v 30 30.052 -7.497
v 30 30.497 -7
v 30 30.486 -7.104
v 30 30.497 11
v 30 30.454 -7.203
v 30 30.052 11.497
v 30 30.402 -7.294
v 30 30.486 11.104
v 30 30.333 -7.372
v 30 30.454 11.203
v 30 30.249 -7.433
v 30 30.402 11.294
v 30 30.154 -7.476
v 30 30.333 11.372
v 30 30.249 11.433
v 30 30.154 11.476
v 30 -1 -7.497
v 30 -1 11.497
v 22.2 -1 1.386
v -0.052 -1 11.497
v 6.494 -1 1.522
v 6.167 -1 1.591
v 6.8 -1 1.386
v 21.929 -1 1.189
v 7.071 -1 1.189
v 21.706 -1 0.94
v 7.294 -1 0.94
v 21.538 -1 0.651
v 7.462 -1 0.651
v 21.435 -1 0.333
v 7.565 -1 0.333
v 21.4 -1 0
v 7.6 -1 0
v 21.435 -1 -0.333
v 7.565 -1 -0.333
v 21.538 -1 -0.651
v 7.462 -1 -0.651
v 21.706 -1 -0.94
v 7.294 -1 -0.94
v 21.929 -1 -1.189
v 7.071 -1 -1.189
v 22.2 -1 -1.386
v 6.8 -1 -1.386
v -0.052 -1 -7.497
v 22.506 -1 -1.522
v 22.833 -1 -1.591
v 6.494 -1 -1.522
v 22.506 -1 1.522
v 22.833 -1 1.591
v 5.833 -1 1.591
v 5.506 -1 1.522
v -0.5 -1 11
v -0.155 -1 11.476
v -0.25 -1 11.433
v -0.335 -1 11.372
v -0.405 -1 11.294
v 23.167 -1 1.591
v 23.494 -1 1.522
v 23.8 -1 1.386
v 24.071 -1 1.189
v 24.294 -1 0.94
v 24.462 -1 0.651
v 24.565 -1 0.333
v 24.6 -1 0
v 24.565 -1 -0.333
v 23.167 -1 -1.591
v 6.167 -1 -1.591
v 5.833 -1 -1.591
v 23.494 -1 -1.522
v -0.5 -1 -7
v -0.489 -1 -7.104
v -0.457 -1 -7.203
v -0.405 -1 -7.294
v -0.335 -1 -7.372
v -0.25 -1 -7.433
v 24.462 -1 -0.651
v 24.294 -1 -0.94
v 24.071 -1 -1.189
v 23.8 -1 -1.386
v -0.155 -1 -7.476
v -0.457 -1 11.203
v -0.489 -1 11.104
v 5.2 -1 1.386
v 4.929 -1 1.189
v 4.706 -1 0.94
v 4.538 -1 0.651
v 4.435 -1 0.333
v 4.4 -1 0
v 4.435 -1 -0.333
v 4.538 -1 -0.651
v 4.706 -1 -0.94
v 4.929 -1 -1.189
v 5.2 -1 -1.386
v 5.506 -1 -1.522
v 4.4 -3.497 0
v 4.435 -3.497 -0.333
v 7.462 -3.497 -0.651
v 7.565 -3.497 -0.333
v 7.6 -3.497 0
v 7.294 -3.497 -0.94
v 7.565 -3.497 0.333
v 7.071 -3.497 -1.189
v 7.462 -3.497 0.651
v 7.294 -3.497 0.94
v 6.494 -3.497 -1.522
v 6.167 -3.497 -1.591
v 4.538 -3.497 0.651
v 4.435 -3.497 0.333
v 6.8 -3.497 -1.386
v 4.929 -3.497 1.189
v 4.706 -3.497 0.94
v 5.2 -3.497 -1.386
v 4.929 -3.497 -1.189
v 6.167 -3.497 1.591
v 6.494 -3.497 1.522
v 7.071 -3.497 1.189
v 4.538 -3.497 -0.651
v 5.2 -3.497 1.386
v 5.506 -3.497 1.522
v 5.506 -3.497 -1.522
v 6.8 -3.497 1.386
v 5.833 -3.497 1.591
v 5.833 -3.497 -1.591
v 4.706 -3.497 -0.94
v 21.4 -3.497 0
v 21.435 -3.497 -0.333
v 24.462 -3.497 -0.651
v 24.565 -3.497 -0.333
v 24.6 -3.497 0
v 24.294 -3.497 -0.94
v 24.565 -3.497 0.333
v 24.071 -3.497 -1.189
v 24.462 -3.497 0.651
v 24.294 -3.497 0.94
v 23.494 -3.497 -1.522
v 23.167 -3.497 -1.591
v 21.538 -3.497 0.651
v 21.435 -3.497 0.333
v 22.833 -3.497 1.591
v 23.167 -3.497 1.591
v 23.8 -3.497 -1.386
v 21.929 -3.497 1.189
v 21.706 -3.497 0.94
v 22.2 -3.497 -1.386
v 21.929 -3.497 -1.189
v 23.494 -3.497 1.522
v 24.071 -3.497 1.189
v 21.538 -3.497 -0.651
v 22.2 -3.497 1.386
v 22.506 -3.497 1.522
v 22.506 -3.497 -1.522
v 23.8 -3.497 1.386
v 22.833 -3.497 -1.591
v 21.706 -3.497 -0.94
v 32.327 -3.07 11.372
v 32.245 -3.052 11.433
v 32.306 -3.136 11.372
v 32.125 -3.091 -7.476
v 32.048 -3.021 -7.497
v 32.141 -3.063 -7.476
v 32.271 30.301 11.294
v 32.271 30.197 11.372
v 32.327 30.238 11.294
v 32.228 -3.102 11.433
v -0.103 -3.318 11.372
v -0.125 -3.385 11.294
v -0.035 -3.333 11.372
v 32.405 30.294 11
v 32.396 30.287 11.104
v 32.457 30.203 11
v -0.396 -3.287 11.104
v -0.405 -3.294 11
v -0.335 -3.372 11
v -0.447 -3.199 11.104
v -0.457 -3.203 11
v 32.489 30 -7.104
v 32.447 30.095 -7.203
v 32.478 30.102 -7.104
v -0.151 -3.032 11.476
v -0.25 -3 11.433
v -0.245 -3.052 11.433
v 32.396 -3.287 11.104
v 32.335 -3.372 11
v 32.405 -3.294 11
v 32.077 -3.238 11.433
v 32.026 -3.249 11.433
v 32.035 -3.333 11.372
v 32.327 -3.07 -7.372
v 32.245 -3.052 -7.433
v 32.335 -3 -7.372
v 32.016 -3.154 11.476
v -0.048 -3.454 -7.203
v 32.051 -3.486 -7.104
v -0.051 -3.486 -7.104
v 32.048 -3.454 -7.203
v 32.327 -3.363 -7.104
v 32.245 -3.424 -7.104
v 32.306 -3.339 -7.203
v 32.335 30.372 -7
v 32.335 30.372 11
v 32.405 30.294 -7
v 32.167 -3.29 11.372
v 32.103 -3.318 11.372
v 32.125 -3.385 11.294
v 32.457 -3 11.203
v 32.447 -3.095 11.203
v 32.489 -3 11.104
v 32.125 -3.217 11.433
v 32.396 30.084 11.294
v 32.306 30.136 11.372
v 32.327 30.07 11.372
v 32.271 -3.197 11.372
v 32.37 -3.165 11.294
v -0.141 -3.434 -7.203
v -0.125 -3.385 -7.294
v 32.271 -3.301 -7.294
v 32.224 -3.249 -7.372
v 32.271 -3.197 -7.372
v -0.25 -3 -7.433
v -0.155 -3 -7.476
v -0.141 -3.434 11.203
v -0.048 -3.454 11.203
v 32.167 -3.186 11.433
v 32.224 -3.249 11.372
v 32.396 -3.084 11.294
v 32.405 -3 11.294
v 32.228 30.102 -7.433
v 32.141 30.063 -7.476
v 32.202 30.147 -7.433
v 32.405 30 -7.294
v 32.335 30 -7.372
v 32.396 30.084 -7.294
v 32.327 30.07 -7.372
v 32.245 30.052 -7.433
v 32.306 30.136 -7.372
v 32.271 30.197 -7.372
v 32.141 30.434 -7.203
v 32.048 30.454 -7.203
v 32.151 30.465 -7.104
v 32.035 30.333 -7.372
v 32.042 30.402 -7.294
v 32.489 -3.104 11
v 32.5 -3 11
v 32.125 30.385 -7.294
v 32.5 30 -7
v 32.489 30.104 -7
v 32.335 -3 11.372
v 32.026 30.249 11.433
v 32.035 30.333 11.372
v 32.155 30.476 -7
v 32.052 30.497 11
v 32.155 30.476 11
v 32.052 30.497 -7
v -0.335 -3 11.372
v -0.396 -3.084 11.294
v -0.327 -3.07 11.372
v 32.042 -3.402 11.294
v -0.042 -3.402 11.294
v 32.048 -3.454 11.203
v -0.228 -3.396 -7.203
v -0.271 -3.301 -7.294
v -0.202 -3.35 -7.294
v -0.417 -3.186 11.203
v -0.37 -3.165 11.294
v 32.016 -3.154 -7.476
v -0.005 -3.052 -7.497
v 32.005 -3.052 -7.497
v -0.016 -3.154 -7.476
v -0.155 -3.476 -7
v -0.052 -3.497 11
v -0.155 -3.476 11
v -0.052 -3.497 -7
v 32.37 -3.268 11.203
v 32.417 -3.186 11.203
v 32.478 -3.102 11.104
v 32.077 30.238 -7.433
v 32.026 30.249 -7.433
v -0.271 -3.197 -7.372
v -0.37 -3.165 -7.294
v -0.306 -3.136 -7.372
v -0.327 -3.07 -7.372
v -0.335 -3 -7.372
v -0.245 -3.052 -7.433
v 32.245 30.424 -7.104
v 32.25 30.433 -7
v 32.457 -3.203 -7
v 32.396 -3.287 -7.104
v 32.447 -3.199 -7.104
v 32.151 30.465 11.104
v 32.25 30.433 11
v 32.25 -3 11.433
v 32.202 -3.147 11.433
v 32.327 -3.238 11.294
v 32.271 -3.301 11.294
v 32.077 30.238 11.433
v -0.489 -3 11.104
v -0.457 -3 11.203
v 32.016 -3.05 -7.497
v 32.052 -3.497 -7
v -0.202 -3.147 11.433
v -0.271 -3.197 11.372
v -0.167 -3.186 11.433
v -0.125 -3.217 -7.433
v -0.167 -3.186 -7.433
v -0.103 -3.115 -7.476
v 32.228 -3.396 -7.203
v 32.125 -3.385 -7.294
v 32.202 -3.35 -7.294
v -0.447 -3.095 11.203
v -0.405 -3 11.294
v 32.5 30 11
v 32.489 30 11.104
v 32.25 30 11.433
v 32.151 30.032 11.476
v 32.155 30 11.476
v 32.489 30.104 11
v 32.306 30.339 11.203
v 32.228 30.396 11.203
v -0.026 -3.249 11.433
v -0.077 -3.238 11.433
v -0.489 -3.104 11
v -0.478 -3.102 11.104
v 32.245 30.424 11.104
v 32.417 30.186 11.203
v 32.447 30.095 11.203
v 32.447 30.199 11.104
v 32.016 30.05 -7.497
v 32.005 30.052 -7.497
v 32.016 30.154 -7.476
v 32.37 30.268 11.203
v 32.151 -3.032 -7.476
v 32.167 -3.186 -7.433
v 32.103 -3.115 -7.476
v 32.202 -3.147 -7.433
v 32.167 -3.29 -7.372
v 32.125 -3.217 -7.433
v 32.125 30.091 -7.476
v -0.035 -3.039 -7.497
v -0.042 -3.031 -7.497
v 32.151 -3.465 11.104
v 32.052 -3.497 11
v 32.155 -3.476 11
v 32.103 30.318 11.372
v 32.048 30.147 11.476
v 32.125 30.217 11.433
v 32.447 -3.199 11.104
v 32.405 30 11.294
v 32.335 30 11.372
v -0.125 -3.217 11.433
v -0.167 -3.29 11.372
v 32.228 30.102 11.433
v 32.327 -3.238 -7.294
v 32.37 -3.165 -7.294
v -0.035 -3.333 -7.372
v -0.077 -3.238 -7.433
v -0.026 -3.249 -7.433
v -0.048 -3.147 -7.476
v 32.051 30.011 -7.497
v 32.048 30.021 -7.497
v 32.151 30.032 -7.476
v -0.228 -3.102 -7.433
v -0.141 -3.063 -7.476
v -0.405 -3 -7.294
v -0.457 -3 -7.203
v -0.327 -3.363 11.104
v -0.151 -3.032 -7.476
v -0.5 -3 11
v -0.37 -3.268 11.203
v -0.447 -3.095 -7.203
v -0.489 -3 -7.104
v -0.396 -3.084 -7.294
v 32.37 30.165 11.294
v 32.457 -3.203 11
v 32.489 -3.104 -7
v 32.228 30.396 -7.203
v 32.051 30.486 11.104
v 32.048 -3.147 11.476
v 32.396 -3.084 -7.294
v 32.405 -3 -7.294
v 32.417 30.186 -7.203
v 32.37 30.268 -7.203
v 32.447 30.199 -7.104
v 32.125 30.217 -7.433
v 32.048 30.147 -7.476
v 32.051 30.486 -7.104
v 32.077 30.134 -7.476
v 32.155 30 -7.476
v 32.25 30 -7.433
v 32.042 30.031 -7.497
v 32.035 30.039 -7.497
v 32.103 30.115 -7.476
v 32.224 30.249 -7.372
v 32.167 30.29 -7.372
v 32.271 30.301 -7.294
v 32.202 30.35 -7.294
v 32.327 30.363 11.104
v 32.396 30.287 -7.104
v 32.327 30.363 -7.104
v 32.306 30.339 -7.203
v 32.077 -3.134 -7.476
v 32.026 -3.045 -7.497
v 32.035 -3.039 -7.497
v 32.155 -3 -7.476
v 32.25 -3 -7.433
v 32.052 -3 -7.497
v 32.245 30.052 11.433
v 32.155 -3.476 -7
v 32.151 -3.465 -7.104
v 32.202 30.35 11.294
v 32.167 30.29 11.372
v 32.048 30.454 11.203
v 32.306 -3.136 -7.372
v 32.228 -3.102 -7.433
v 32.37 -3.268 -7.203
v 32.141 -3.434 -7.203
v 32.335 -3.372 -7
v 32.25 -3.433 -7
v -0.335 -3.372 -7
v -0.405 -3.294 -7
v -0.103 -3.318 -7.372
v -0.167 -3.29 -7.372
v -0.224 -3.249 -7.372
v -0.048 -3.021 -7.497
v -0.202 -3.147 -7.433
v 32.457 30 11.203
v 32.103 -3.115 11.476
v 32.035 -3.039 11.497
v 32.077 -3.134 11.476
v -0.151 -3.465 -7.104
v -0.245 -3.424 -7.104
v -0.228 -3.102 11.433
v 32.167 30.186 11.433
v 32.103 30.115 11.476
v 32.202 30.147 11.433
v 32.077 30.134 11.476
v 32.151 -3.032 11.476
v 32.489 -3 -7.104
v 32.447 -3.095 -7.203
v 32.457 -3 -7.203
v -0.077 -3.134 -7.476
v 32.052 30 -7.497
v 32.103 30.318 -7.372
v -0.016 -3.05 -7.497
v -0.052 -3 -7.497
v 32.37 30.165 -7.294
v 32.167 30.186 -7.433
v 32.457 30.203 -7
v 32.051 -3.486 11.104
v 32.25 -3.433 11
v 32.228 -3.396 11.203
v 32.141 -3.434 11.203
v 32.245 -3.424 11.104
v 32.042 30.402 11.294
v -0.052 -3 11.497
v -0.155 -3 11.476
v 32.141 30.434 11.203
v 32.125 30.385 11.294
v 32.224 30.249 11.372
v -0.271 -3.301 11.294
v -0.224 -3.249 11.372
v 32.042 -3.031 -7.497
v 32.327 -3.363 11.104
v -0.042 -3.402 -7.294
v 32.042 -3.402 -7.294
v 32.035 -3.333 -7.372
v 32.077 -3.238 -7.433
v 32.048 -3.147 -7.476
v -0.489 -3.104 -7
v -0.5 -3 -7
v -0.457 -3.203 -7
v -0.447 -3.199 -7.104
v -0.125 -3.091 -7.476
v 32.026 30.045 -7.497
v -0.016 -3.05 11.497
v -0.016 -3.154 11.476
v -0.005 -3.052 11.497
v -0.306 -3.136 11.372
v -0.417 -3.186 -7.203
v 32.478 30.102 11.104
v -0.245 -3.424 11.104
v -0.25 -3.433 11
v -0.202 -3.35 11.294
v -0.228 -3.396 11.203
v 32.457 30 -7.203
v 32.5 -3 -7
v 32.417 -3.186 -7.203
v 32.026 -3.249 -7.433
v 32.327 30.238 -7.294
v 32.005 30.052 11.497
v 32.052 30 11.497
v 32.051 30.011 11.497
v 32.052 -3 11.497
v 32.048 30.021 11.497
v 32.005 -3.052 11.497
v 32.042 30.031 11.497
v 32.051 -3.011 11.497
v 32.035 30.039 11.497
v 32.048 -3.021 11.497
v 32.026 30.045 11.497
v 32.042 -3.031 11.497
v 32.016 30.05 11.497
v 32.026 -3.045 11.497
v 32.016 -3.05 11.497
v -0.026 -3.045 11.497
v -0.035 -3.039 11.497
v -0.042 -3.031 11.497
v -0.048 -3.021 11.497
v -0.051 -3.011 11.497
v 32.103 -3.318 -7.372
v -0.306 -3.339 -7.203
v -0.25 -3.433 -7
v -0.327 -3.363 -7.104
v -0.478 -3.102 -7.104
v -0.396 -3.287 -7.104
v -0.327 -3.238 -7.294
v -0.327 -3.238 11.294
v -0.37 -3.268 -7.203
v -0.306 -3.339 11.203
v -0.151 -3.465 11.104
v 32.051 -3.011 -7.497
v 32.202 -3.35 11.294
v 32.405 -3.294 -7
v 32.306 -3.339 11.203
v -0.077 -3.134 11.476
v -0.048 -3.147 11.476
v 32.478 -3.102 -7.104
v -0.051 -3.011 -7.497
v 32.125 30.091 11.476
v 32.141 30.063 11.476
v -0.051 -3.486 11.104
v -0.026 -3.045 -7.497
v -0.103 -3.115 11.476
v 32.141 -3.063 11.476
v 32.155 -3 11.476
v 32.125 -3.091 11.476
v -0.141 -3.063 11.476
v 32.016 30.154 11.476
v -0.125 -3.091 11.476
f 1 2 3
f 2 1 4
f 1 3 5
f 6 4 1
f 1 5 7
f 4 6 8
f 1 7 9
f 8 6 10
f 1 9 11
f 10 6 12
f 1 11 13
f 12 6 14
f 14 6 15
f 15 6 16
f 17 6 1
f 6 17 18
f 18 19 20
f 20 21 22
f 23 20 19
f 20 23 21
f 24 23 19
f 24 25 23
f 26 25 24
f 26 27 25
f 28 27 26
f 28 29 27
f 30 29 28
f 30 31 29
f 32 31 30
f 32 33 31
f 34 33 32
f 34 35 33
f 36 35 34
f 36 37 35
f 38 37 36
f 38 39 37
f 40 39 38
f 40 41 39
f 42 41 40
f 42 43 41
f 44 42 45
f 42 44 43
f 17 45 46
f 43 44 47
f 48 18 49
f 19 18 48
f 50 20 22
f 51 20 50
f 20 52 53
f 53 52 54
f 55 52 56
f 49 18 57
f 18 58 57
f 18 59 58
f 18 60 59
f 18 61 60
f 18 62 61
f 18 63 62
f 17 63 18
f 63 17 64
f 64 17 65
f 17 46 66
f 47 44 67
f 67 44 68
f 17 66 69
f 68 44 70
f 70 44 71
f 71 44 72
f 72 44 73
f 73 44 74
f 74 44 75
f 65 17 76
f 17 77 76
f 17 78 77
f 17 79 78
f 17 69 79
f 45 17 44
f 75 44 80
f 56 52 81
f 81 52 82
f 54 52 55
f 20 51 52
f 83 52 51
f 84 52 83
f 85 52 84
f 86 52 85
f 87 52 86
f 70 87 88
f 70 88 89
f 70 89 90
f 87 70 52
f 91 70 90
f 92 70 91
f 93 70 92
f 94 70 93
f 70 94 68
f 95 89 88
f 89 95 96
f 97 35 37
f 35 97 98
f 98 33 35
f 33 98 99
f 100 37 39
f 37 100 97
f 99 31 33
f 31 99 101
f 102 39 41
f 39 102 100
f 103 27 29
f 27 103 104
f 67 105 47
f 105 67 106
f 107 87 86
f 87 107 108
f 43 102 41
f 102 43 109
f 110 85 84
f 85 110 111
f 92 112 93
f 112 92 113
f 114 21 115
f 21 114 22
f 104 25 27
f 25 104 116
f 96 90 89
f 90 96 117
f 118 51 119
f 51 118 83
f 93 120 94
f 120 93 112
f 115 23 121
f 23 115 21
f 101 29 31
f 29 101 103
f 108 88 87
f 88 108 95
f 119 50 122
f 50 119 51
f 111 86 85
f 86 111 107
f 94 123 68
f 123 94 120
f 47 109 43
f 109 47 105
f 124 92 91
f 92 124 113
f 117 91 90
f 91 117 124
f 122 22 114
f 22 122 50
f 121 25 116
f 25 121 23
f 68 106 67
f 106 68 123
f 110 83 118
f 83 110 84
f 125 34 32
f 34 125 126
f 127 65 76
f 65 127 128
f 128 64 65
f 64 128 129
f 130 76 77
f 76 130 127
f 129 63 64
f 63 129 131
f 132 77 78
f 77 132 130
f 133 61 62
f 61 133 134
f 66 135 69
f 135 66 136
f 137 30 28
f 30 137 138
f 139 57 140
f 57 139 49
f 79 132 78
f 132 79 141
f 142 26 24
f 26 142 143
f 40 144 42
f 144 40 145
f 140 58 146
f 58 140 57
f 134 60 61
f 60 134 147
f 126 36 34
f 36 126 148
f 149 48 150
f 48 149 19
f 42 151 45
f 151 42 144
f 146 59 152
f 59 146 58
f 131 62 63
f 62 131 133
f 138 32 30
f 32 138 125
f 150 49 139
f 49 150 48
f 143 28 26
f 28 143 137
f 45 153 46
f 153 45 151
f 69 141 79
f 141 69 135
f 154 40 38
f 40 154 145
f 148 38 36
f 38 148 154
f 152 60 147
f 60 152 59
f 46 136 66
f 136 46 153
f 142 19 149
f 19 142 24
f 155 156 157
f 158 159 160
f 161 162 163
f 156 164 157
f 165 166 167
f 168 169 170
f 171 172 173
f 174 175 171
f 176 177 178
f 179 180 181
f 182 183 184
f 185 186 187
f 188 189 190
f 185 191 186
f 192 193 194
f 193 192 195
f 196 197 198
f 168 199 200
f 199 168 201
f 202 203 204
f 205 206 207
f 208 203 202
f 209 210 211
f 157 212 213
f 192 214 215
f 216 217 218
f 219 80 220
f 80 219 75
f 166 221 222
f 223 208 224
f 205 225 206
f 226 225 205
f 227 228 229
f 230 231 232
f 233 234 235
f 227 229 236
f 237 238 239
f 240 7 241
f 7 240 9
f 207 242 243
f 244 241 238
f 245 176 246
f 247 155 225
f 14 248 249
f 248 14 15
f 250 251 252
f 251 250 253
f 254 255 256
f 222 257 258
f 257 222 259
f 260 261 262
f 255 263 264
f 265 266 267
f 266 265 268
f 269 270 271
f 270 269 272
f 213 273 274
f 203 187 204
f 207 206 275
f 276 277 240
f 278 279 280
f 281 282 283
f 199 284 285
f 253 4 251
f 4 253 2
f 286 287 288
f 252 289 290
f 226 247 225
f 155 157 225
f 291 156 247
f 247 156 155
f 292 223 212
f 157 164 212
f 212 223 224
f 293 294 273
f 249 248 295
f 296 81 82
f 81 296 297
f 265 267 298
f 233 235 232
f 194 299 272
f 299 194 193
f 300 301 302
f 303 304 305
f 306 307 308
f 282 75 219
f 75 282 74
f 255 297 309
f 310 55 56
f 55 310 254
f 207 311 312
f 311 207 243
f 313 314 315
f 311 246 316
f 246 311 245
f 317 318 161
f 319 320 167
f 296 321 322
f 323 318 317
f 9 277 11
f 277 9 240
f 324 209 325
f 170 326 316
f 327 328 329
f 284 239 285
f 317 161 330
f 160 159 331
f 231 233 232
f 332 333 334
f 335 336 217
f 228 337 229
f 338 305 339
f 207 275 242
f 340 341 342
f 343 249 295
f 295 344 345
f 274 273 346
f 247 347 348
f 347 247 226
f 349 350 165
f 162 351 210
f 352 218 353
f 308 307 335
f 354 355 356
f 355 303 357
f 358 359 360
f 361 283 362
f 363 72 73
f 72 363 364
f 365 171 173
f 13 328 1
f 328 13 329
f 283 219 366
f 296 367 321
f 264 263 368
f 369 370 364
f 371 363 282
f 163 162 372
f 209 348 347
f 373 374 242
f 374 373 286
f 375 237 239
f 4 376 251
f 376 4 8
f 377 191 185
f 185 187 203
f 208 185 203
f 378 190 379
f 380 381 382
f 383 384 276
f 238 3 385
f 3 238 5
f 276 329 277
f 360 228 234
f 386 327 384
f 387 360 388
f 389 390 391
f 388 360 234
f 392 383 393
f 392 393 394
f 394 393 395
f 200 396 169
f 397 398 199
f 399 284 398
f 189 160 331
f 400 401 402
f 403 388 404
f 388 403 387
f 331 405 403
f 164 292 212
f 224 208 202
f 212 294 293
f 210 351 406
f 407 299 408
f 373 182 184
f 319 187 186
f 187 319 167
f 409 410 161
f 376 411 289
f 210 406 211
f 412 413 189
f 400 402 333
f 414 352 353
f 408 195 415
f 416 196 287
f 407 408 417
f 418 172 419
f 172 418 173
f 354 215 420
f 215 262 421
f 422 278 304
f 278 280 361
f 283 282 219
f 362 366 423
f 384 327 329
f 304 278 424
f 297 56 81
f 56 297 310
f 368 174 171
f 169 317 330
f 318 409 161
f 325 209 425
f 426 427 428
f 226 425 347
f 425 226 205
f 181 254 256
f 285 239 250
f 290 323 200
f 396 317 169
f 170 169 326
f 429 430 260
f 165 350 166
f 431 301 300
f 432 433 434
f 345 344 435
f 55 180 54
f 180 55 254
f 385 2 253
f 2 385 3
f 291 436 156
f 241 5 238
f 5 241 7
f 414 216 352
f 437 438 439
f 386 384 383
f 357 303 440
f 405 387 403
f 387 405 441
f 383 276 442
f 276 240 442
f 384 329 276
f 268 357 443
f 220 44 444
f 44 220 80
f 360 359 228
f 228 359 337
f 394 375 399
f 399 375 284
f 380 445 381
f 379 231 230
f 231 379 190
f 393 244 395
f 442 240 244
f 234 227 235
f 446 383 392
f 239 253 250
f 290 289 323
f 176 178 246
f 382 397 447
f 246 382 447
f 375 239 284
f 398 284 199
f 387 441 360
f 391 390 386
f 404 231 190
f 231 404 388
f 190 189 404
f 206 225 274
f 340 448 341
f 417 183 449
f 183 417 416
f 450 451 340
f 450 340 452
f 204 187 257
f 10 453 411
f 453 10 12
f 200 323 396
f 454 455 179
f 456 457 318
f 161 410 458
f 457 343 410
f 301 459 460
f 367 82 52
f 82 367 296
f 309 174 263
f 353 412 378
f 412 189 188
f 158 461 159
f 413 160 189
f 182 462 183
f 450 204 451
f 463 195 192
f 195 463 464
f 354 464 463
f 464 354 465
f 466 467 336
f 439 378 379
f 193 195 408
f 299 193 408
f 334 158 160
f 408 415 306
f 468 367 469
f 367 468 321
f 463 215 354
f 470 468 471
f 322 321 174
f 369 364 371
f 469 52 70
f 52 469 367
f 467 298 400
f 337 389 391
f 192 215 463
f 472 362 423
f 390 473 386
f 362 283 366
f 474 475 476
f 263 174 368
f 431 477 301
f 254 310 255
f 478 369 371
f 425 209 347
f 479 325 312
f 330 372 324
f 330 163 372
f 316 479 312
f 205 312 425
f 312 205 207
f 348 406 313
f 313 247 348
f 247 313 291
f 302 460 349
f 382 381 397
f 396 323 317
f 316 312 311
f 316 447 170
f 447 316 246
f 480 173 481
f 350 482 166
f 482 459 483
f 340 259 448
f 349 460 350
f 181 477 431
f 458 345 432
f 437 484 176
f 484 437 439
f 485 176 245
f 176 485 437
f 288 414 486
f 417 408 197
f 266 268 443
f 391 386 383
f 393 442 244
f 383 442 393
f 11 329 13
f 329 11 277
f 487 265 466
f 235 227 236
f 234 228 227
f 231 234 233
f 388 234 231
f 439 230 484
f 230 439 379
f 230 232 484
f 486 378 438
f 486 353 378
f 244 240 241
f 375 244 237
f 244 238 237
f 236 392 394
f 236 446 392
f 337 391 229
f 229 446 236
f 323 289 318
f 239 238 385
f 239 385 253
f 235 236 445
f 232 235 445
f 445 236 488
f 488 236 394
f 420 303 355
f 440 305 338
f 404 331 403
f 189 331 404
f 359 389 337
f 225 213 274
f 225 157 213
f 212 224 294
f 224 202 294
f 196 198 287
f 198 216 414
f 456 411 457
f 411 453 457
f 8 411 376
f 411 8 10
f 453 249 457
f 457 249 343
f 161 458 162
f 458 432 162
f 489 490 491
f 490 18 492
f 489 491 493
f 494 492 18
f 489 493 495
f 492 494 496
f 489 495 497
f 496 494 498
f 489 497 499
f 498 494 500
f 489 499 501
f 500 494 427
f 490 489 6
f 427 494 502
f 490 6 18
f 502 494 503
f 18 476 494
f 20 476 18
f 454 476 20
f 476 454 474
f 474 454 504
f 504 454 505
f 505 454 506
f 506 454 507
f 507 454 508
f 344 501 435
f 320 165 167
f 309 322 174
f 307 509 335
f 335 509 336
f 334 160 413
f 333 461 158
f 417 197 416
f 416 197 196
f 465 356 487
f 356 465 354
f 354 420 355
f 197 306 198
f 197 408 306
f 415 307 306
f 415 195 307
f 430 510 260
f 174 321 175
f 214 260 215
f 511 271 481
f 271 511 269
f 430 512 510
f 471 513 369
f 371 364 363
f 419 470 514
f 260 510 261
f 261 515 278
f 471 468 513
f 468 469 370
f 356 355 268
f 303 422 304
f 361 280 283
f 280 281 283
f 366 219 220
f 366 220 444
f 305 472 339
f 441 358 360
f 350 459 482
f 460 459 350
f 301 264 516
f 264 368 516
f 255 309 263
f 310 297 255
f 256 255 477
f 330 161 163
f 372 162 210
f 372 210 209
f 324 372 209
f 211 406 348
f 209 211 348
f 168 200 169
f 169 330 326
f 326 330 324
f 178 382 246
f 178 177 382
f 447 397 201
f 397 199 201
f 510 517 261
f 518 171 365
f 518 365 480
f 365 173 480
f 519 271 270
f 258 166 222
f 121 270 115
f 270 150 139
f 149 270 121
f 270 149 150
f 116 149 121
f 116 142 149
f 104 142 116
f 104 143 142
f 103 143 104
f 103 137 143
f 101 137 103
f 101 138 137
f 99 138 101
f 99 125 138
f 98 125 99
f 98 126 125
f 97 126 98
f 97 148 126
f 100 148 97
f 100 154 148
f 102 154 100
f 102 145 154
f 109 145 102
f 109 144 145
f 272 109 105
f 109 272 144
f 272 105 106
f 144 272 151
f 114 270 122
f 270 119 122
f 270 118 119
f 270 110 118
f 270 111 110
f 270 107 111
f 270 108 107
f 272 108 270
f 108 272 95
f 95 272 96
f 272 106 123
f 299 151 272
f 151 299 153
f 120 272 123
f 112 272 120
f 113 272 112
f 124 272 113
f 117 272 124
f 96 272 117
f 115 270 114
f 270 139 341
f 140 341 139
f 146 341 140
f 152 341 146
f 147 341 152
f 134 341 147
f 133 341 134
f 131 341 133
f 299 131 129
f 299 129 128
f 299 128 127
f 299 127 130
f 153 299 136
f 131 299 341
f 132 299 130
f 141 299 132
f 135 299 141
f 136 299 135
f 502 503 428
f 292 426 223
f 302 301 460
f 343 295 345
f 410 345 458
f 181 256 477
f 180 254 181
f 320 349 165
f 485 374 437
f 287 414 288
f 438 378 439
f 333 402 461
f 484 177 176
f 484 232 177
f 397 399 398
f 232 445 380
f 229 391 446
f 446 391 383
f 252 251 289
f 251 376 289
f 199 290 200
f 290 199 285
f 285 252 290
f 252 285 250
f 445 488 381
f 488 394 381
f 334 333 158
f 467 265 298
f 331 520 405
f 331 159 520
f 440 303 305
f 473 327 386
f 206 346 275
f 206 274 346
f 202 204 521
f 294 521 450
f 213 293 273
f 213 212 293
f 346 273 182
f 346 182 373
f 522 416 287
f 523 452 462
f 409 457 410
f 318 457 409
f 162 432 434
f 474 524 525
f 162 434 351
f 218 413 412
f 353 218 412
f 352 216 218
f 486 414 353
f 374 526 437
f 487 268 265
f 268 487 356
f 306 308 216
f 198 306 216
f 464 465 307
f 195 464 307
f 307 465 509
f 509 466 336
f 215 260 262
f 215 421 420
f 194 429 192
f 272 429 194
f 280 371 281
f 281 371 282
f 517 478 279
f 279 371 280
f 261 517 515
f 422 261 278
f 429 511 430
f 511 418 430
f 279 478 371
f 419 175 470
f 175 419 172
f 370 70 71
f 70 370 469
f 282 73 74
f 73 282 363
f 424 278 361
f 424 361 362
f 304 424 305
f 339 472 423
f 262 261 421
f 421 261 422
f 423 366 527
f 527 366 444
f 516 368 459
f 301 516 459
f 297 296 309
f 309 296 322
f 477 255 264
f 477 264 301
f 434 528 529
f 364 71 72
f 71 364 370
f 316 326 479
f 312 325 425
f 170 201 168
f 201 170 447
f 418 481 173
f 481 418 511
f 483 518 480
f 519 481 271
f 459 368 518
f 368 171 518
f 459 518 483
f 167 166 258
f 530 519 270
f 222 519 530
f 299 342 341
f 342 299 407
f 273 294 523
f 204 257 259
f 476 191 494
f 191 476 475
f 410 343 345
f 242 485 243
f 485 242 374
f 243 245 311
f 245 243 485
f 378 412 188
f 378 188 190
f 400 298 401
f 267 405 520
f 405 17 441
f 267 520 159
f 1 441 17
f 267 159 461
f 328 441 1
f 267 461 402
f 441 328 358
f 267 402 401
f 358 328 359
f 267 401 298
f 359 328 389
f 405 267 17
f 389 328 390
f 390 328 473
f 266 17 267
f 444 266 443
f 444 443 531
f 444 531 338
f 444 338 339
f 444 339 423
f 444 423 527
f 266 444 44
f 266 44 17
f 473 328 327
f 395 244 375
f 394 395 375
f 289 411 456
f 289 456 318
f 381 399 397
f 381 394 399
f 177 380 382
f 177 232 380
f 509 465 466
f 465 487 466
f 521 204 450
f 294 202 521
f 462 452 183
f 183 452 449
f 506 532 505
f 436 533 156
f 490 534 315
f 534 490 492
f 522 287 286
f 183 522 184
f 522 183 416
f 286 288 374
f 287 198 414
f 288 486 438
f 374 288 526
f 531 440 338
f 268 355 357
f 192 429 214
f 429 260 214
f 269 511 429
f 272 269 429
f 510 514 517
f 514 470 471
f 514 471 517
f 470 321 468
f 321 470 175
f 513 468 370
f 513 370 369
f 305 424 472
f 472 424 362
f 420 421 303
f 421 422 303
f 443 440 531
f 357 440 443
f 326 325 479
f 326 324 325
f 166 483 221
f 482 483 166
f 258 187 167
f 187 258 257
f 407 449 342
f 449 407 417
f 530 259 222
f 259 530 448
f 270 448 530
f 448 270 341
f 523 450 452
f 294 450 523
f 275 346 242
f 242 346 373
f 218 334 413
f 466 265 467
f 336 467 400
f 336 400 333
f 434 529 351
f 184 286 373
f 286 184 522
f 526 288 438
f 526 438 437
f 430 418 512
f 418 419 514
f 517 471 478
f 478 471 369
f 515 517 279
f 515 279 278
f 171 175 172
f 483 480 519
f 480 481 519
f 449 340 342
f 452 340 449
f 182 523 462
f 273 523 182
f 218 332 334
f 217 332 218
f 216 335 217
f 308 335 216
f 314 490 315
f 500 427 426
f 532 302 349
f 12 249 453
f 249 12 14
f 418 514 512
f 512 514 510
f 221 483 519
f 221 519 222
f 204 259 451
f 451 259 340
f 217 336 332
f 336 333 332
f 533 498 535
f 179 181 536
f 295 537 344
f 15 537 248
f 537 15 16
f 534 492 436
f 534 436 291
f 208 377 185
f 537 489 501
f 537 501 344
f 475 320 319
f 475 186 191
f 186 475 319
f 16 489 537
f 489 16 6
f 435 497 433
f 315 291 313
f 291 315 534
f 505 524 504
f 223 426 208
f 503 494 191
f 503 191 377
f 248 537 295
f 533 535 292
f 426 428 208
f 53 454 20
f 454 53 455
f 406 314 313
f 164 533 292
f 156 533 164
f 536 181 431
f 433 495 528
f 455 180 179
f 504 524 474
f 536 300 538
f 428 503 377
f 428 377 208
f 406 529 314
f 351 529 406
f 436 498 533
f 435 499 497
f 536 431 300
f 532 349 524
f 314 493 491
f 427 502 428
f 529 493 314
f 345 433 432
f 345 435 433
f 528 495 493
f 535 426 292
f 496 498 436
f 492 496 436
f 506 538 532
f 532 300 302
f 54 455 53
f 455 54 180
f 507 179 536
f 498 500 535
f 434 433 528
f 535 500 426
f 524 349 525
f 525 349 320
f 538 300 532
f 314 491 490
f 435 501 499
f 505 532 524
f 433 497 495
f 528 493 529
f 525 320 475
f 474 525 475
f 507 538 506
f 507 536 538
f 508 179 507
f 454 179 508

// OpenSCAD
wt = 3;
$fn = 30;
top_height = 11;
bottom_height = 7;
x_dim = 29;
difference(){
  
  minkowski(){
    translate([0,-wt,-bottom_height])cube([x_dim+wt,30+wt,top_height+bottom_height]);
     sphere(r=0.5);
  }
  
  union(){
  translate([-1,-1,-bottom_height-1])cube([x_dim+2,32,top_height+bottom_height+2]);

  translate([6,-10,0])rotate([-90,0,0])cylinder(r=1.6,100);
  translate([6+17,-10,0])rotate([-90,0,0])cylinder(r=1.6,100);

  }

}
